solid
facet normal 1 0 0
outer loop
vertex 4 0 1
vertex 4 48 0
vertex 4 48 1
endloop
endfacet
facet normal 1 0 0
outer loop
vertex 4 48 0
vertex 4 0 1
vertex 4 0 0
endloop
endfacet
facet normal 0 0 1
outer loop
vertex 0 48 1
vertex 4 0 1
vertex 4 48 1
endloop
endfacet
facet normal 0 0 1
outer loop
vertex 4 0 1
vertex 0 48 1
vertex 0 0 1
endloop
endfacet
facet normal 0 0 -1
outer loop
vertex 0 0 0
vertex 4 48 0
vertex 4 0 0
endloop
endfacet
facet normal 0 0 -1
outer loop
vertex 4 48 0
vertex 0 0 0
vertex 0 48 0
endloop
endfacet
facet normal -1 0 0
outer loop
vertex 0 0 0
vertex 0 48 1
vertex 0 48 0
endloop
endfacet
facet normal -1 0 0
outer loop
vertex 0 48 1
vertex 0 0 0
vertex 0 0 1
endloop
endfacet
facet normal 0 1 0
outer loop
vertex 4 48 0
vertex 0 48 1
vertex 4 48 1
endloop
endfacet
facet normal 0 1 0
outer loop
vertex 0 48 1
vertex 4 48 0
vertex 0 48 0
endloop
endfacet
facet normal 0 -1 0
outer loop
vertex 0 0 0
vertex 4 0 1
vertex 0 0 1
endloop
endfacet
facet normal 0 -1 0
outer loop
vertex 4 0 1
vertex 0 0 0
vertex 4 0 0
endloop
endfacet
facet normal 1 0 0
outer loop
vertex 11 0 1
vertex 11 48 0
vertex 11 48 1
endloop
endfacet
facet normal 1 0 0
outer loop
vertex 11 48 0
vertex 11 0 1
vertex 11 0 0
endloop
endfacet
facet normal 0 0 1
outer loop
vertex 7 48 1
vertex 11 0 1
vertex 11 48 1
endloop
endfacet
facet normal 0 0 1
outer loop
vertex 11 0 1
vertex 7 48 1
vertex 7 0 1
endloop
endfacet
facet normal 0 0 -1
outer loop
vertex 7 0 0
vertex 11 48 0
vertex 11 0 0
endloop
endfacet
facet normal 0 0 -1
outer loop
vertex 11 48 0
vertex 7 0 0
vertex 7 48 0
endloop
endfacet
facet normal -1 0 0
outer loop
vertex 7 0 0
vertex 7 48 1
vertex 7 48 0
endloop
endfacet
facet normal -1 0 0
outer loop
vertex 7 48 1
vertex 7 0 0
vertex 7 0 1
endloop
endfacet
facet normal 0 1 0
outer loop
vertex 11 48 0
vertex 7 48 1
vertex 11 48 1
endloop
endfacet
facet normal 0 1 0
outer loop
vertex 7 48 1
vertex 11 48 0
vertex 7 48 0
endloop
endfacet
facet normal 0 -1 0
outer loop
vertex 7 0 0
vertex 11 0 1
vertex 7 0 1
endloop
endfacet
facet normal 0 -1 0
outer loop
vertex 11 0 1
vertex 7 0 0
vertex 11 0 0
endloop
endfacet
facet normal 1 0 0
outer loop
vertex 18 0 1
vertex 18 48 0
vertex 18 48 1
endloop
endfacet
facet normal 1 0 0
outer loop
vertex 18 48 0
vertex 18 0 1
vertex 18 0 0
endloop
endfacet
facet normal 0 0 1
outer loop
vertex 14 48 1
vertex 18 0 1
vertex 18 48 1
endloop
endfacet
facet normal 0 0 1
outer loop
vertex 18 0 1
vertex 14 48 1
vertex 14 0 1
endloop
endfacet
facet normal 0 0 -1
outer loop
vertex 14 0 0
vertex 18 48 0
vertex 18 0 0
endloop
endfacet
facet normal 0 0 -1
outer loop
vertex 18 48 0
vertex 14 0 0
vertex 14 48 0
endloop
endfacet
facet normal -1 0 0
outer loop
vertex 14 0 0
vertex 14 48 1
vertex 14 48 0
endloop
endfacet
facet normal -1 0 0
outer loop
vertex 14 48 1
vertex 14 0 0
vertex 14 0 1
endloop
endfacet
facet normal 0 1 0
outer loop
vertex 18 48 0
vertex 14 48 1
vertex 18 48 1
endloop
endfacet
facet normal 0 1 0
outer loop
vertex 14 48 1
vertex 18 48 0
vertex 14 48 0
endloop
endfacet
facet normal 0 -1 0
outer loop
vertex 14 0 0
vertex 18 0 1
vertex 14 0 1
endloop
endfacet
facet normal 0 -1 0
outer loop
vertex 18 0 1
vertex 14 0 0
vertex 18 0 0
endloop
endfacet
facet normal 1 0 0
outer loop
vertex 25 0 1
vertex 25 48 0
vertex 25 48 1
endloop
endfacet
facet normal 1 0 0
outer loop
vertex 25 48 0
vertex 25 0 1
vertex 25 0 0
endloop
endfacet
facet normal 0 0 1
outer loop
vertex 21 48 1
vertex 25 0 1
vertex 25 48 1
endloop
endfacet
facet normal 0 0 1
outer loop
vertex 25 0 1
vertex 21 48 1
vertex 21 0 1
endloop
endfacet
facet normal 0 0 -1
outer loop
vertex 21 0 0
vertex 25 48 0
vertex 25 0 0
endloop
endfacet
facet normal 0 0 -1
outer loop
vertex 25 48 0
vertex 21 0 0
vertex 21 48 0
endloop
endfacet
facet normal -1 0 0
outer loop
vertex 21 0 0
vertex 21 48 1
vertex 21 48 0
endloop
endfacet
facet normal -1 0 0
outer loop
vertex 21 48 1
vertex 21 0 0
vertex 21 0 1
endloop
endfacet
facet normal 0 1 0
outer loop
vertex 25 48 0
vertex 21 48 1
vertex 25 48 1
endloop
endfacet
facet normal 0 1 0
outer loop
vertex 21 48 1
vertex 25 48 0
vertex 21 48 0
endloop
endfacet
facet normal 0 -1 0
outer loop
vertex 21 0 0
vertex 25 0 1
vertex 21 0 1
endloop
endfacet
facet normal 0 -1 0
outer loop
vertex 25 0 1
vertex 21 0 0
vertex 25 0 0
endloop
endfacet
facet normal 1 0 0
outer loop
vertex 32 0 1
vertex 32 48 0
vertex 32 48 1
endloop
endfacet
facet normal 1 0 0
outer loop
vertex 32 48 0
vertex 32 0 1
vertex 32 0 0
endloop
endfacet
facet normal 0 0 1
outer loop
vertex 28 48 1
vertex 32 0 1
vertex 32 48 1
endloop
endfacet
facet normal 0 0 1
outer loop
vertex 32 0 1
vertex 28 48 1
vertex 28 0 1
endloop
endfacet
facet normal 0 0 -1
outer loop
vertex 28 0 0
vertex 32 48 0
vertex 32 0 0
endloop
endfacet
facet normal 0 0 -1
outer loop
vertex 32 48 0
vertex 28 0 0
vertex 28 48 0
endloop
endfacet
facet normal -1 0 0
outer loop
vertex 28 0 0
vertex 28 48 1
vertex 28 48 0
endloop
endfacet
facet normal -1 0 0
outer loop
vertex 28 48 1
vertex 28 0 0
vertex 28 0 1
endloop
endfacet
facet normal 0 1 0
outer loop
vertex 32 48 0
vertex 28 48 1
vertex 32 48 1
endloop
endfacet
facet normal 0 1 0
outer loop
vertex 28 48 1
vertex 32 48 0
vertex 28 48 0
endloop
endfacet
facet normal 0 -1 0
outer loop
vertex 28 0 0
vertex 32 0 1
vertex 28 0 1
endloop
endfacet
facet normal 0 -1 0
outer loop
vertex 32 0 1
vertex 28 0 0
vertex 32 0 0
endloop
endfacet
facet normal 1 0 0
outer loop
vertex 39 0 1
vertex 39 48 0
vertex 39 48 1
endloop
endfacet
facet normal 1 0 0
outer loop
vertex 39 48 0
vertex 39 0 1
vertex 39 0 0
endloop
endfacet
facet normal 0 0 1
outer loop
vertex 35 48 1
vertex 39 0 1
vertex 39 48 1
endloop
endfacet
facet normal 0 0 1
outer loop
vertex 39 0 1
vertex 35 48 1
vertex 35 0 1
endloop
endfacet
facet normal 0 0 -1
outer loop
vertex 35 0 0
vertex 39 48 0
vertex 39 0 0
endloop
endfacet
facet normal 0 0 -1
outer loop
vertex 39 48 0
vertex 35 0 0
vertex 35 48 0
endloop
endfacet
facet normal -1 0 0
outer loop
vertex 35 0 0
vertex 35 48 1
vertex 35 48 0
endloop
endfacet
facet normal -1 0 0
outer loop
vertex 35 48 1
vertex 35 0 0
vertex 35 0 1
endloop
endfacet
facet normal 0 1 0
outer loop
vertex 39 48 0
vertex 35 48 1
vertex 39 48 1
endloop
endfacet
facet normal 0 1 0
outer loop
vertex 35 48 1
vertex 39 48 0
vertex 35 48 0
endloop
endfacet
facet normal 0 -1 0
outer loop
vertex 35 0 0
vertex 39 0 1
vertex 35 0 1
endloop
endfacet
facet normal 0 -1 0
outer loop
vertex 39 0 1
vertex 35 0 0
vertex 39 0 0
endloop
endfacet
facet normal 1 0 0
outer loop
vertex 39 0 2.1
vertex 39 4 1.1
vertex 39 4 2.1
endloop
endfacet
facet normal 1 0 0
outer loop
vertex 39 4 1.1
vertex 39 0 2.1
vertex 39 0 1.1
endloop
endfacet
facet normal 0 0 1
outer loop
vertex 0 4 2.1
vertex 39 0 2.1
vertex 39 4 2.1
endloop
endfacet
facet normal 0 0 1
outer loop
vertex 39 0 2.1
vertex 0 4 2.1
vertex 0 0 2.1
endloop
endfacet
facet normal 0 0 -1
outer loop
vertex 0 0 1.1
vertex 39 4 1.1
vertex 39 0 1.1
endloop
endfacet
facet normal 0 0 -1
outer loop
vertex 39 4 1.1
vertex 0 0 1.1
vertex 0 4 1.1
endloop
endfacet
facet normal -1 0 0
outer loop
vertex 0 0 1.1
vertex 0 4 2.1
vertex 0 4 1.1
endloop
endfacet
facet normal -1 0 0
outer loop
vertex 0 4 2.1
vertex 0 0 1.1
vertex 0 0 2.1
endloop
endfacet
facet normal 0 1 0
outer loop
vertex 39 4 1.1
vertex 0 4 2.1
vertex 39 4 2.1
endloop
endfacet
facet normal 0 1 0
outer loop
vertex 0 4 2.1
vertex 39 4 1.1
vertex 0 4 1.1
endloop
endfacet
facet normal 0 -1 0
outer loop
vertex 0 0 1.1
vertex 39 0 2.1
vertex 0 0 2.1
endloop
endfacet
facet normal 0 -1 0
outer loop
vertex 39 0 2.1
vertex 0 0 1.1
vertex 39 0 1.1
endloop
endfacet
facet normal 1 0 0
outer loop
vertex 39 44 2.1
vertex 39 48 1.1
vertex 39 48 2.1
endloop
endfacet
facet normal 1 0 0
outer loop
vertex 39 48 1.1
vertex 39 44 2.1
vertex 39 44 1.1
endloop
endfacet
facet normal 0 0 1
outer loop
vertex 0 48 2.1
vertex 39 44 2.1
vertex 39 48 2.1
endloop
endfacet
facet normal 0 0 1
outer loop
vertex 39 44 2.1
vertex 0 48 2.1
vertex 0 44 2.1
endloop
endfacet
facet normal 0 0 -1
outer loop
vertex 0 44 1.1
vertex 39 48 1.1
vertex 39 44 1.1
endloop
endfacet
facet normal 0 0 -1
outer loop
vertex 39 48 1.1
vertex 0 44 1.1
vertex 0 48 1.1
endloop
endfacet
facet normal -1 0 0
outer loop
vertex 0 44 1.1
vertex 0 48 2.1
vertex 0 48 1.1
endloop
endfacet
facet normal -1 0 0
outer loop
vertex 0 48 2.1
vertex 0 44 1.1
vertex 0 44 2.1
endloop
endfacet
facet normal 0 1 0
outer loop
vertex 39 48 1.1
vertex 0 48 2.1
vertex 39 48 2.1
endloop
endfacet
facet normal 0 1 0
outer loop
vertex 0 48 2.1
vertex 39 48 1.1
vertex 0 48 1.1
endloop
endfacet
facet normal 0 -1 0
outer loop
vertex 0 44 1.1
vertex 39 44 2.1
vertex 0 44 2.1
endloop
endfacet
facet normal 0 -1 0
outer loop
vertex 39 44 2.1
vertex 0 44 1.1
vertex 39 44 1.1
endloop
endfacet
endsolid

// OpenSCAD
// assuming all in inches

picket_width=4;
picket_gap=3;
picket_height=4*12;
picket_depth=1;

fence_length=13*12;
fence_length=5*12;
fence_length=3*12;

cube([picket_width,picket_height,picket_depth]);


number_pickets=floor(fence_length/(picket_width+picket_gap))+1;

echo(number_pickets);


actual_fence_length=(number_pickets-1)*(picket_width+picket_gap)+picket_width;

echo(actual_fence_length/12);

for ( j = [0:1:number_pickets-1]) {
    translate([(picket_gap+picket_width)*j,0,0])
    cube([picket_width,picket_height,picket_depth]);
    
    
}

translate([0,0,picket_depth*1.1]) {
//lower railing
    color([1,0,0])
cube([actual_fence_length,picket_width,picket_depth]);

//upper railing
translate([0,picket_height-picket_width,0])
    color([1,0,0])
cube([actual_fence_length,picket_width,picket_depth]);
    
}
